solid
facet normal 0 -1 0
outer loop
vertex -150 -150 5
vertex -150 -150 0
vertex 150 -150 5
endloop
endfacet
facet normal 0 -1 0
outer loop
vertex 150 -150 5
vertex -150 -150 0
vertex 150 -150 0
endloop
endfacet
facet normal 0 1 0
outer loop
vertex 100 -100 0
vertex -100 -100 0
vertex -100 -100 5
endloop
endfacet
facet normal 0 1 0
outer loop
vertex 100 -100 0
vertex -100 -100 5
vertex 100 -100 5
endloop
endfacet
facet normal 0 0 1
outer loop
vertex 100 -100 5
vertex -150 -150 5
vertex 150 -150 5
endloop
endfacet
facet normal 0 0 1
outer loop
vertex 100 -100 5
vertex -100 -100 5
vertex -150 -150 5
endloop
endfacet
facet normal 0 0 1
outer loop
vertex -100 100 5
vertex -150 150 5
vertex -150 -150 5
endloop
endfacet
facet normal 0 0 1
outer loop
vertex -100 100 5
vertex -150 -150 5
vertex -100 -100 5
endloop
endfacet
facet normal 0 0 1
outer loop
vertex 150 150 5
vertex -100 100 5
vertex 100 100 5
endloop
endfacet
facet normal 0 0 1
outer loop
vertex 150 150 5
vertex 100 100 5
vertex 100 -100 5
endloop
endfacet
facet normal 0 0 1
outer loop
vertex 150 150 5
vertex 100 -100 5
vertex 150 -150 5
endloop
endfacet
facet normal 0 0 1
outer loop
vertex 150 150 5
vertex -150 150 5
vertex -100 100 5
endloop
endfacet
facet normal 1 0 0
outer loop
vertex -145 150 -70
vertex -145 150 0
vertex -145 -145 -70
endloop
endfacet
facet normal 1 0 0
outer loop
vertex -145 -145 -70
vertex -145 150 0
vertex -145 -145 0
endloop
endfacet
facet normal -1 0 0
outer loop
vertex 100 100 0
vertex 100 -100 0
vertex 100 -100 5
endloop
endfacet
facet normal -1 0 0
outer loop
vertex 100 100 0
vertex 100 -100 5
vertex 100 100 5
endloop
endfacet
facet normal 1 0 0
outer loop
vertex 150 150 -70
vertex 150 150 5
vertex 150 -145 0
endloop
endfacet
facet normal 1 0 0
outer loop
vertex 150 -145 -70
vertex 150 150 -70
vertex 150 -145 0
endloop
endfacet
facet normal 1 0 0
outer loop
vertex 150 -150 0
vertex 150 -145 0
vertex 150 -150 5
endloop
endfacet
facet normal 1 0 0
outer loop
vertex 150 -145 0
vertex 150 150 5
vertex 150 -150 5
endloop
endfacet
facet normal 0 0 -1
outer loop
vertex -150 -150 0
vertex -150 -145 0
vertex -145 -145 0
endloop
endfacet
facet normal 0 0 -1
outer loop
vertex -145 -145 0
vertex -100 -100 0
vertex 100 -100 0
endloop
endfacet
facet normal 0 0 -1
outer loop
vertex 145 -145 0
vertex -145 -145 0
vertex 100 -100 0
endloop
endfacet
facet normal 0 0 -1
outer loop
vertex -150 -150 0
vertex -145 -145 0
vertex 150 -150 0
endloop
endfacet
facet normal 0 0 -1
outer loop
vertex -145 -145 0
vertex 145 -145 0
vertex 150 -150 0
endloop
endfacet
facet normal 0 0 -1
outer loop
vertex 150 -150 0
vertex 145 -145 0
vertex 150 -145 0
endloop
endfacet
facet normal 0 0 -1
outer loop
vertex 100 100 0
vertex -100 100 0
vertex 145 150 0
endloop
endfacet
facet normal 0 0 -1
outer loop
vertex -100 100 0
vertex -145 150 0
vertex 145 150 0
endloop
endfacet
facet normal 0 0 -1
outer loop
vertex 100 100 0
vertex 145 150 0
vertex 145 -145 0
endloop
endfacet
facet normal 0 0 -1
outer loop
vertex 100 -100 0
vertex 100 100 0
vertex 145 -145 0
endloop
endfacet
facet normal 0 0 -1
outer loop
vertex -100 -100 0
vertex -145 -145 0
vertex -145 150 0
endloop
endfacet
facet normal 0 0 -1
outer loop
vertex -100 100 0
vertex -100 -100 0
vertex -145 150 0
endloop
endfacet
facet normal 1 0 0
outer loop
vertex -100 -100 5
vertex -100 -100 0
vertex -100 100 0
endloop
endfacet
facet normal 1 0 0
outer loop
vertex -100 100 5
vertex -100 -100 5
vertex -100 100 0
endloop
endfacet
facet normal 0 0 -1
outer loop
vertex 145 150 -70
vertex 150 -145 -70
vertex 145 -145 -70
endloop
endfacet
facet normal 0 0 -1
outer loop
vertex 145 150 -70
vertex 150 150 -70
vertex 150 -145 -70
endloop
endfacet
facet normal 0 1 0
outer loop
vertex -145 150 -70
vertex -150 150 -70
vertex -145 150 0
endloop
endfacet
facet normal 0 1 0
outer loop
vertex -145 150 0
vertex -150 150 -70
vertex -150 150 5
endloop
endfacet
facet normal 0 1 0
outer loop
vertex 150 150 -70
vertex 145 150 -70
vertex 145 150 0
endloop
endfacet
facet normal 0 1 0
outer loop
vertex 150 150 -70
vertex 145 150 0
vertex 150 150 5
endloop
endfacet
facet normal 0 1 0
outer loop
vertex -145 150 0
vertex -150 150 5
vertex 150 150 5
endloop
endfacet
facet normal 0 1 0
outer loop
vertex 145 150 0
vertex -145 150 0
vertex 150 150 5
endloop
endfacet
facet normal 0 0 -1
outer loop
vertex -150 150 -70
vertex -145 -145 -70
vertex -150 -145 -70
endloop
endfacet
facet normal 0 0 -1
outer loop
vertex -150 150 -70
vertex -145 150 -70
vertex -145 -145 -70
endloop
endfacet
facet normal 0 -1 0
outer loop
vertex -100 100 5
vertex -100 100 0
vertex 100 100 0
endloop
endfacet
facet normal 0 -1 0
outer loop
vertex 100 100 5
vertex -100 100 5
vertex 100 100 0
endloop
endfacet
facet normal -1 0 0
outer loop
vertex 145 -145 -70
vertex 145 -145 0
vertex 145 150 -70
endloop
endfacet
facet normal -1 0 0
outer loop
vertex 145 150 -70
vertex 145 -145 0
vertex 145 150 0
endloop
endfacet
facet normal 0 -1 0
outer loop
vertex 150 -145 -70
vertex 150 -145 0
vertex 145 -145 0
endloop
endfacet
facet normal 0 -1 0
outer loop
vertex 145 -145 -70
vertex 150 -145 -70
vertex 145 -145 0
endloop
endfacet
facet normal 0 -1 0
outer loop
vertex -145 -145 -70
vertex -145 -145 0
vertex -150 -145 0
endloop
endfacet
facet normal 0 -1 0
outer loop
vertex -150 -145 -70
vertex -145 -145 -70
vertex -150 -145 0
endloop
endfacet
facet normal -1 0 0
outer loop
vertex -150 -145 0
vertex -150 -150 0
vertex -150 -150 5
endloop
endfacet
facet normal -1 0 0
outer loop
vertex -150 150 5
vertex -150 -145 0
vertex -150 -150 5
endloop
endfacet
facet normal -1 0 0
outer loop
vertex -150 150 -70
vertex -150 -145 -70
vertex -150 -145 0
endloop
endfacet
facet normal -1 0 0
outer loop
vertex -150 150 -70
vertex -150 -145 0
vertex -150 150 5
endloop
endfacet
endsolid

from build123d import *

# Parameters (mm, degrees)
SKETCH1_W           = 300
SKETCH1_H           = 300
SKETCH1_W_2         = 200
SKETCH1_H_2         = 200
BOSS_EXTRUDE1_DEPTH = 5
BOSS_EXTRUDE5_DEPTH = 70


with BuildPart() as part:
    # Sketch1 → Boss-Extrude1 (new body)
    with BuildSketch(Plane.XY):
        Rectangle(SKETCH1_W, SKETCH1_H)
        Rectangle(SKETCH1_W_2, SKETCH1_H_2, mode=Mode.SUBTRACT)
    extrude(amount=BOSS_EXTRUDE1_DEPTH)

    # Sketch2 → Boss-Extrude5 (add)
    with BuildSketch(Plane(origin=(0, 0, 0), x_dir=(-1, 0, 0), z_dir=(0, 0, -1))):
        Polygon((-150, -145), (-145, -145), (-145, 145), (-145, 150), (-150, 150), align=None)
        Polygon((145, 145), (145, -145), (150, -145), (150, 150), (145, 150), align=None)
    extrude(amount=BOSS_EXTRUDE5_DEPTH)


solid = part.part
